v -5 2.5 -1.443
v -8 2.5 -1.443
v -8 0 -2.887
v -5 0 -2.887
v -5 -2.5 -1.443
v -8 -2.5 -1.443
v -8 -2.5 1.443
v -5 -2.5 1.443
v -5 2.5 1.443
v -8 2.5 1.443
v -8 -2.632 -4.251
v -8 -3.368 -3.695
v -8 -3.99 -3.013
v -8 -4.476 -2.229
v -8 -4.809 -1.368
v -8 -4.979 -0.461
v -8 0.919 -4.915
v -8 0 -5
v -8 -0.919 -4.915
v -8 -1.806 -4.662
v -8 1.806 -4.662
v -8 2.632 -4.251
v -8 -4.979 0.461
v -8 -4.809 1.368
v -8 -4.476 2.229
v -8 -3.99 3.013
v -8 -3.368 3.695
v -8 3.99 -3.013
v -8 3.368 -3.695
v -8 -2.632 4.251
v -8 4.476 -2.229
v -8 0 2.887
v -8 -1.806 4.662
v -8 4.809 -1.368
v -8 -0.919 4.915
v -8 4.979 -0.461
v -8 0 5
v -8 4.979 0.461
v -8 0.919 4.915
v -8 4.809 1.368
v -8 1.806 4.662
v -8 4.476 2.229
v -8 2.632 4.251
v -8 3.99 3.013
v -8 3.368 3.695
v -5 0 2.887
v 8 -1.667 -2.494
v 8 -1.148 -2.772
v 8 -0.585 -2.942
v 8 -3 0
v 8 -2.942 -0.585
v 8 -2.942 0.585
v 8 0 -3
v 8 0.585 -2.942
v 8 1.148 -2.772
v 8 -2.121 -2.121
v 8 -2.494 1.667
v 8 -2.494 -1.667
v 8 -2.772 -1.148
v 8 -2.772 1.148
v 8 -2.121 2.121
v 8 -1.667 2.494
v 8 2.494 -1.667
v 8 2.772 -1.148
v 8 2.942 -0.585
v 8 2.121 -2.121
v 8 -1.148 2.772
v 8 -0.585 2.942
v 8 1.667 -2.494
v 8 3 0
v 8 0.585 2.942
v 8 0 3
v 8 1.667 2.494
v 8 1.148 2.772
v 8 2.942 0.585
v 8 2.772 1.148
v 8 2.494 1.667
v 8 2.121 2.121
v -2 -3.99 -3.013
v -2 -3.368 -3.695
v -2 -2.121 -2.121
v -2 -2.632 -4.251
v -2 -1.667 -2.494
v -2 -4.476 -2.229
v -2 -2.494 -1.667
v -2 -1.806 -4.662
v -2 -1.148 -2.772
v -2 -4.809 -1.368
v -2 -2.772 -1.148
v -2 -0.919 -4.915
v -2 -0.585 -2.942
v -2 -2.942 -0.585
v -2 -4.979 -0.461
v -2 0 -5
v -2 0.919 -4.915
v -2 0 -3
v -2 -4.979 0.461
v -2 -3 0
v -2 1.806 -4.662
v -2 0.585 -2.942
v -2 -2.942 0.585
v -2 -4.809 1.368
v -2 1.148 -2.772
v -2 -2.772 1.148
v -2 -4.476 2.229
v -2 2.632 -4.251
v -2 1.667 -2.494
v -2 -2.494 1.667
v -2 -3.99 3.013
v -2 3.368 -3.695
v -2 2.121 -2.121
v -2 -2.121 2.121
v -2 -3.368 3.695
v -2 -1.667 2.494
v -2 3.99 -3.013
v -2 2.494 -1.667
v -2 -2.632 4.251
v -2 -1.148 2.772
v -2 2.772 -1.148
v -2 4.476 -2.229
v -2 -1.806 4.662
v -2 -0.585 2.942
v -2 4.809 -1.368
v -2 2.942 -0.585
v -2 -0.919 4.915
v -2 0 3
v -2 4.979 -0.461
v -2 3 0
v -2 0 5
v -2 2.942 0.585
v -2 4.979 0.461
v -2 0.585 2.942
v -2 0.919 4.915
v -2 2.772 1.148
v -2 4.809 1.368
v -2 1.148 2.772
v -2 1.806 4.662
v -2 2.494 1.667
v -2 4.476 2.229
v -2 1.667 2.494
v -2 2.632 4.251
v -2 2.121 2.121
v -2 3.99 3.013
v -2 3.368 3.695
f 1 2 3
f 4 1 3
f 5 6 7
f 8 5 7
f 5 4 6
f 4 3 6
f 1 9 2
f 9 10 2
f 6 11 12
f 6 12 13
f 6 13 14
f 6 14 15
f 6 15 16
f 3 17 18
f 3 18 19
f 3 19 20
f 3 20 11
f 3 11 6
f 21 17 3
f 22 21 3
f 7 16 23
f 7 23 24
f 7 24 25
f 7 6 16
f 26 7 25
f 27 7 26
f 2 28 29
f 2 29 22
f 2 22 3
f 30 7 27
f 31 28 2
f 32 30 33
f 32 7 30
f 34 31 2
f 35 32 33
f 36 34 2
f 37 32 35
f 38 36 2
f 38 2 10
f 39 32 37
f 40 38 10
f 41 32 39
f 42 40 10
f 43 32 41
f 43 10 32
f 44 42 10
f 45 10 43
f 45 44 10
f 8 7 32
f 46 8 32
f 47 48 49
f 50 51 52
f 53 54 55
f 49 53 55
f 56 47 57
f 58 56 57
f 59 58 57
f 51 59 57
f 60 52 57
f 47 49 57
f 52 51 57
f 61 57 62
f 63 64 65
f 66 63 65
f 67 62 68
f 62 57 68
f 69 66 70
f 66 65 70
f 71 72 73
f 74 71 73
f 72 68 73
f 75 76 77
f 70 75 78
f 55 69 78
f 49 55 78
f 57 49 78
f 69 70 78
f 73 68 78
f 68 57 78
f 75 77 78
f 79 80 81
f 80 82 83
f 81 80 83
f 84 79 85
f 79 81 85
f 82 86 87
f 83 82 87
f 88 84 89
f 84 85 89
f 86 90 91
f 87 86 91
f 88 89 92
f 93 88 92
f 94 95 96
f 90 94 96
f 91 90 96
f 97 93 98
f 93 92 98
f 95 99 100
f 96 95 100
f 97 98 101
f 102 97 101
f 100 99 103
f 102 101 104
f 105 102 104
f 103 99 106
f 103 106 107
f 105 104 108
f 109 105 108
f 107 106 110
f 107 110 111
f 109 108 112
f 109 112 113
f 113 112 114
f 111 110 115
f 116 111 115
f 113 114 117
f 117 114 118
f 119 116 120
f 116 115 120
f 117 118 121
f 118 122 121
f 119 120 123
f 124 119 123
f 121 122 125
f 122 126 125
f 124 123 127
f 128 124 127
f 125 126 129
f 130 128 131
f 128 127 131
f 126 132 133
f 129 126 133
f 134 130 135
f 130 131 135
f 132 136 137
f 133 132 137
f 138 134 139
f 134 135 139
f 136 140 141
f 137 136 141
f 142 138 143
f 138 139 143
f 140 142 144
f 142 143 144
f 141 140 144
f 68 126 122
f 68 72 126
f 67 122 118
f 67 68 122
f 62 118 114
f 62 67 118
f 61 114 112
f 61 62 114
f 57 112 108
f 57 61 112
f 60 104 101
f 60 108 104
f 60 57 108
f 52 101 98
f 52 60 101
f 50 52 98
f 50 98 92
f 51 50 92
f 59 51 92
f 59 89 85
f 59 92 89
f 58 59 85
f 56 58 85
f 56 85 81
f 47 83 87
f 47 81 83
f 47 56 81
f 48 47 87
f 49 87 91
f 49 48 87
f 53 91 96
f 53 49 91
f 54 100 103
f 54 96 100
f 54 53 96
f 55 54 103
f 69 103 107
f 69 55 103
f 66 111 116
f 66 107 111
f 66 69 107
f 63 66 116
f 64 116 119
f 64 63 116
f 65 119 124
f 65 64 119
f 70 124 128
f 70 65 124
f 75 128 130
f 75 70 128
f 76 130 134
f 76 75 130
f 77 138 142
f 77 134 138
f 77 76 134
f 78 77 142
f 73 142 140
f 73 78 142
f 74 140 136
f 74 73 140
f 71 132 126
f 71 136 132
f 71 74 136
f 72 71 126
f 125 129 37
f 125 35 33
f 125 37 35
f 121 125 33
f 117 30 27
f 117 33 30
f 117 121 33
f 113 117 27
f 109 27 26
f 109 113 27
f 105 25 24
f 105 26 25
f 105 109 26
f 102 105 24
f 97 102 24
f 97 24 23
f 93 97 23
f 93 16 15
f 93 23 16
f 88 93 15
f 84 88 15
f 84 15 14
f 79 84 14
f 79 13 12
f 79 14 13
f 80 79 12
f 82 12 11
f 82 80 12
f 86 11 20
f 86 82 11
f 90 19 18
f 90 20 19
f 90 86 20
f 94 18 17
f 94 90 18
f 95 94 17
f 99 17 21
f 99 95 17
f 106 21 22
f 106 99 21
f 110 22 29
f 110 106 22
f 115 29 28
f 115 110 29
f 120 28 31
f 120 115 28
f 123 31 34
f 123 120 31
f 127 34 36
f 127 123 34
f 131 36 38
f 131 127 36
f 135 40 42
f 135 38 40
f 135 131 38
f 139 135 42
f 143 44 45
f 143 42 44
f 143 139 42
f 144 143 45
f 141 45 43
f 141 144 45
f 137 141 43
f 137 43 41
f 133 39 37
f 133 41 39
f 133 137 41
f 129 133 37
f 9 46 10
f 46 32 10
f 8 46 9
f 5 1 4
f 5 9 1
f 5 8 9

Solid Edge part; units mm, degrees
sketch "Sketch1" plane through (10.8674, 0, 10.8674) normal (0, -1, 0) x (1, 0, 0)
  line L0 (-18.8674, -10.8674) -> (-18.8674, -5.8674)
  line L1 (-18.8674, -5.8674) -> (-12.8674, -5.8674)
  line L2 (-12.8674, -5.8674) -> (-12.8674, -7.8674)
  line L3 (-12.8674, -7.8674) -> (-2.8674, -7.8674)
  line L4 (-2.8674, -7.8674) -> (-2.8674, -10.8674)
  dimension "D1" = 6
  dimension "D2" = 10
revolve "RevolvedProtrusion1" add sketch "Sketch1" angle 360 about axis through (16.5, 0, 0) along (-1, 0, 0)
sketch "Sketch2" plane through (-8, 0, 0) normal (-1, 0, 0) x (0, 0, -1)
  line L0 (2.8868, 0) -> (1.4434, 2.5)
  line L1 (1.4434, 2.5) -> (-1.4434, 2.5)
  line L2 (-1.4434, 2.5) -> (-2.8868, 0)
  line L3 (-2.8868, 0) -> (-1.4434, -2.5)
  line L4 (-1.4434, -2.5) -> (1.4434, -2.5)
  line L5 (1.4434, -2.5) -> (2.8868, 0)
  dimension "D1" = 5
extrude "Cutout1" cut sketch "Sketch2" against normal blind 3
cosmetic_thread "Gänga" size "M6" thread depth 8
properties material "Steel"
